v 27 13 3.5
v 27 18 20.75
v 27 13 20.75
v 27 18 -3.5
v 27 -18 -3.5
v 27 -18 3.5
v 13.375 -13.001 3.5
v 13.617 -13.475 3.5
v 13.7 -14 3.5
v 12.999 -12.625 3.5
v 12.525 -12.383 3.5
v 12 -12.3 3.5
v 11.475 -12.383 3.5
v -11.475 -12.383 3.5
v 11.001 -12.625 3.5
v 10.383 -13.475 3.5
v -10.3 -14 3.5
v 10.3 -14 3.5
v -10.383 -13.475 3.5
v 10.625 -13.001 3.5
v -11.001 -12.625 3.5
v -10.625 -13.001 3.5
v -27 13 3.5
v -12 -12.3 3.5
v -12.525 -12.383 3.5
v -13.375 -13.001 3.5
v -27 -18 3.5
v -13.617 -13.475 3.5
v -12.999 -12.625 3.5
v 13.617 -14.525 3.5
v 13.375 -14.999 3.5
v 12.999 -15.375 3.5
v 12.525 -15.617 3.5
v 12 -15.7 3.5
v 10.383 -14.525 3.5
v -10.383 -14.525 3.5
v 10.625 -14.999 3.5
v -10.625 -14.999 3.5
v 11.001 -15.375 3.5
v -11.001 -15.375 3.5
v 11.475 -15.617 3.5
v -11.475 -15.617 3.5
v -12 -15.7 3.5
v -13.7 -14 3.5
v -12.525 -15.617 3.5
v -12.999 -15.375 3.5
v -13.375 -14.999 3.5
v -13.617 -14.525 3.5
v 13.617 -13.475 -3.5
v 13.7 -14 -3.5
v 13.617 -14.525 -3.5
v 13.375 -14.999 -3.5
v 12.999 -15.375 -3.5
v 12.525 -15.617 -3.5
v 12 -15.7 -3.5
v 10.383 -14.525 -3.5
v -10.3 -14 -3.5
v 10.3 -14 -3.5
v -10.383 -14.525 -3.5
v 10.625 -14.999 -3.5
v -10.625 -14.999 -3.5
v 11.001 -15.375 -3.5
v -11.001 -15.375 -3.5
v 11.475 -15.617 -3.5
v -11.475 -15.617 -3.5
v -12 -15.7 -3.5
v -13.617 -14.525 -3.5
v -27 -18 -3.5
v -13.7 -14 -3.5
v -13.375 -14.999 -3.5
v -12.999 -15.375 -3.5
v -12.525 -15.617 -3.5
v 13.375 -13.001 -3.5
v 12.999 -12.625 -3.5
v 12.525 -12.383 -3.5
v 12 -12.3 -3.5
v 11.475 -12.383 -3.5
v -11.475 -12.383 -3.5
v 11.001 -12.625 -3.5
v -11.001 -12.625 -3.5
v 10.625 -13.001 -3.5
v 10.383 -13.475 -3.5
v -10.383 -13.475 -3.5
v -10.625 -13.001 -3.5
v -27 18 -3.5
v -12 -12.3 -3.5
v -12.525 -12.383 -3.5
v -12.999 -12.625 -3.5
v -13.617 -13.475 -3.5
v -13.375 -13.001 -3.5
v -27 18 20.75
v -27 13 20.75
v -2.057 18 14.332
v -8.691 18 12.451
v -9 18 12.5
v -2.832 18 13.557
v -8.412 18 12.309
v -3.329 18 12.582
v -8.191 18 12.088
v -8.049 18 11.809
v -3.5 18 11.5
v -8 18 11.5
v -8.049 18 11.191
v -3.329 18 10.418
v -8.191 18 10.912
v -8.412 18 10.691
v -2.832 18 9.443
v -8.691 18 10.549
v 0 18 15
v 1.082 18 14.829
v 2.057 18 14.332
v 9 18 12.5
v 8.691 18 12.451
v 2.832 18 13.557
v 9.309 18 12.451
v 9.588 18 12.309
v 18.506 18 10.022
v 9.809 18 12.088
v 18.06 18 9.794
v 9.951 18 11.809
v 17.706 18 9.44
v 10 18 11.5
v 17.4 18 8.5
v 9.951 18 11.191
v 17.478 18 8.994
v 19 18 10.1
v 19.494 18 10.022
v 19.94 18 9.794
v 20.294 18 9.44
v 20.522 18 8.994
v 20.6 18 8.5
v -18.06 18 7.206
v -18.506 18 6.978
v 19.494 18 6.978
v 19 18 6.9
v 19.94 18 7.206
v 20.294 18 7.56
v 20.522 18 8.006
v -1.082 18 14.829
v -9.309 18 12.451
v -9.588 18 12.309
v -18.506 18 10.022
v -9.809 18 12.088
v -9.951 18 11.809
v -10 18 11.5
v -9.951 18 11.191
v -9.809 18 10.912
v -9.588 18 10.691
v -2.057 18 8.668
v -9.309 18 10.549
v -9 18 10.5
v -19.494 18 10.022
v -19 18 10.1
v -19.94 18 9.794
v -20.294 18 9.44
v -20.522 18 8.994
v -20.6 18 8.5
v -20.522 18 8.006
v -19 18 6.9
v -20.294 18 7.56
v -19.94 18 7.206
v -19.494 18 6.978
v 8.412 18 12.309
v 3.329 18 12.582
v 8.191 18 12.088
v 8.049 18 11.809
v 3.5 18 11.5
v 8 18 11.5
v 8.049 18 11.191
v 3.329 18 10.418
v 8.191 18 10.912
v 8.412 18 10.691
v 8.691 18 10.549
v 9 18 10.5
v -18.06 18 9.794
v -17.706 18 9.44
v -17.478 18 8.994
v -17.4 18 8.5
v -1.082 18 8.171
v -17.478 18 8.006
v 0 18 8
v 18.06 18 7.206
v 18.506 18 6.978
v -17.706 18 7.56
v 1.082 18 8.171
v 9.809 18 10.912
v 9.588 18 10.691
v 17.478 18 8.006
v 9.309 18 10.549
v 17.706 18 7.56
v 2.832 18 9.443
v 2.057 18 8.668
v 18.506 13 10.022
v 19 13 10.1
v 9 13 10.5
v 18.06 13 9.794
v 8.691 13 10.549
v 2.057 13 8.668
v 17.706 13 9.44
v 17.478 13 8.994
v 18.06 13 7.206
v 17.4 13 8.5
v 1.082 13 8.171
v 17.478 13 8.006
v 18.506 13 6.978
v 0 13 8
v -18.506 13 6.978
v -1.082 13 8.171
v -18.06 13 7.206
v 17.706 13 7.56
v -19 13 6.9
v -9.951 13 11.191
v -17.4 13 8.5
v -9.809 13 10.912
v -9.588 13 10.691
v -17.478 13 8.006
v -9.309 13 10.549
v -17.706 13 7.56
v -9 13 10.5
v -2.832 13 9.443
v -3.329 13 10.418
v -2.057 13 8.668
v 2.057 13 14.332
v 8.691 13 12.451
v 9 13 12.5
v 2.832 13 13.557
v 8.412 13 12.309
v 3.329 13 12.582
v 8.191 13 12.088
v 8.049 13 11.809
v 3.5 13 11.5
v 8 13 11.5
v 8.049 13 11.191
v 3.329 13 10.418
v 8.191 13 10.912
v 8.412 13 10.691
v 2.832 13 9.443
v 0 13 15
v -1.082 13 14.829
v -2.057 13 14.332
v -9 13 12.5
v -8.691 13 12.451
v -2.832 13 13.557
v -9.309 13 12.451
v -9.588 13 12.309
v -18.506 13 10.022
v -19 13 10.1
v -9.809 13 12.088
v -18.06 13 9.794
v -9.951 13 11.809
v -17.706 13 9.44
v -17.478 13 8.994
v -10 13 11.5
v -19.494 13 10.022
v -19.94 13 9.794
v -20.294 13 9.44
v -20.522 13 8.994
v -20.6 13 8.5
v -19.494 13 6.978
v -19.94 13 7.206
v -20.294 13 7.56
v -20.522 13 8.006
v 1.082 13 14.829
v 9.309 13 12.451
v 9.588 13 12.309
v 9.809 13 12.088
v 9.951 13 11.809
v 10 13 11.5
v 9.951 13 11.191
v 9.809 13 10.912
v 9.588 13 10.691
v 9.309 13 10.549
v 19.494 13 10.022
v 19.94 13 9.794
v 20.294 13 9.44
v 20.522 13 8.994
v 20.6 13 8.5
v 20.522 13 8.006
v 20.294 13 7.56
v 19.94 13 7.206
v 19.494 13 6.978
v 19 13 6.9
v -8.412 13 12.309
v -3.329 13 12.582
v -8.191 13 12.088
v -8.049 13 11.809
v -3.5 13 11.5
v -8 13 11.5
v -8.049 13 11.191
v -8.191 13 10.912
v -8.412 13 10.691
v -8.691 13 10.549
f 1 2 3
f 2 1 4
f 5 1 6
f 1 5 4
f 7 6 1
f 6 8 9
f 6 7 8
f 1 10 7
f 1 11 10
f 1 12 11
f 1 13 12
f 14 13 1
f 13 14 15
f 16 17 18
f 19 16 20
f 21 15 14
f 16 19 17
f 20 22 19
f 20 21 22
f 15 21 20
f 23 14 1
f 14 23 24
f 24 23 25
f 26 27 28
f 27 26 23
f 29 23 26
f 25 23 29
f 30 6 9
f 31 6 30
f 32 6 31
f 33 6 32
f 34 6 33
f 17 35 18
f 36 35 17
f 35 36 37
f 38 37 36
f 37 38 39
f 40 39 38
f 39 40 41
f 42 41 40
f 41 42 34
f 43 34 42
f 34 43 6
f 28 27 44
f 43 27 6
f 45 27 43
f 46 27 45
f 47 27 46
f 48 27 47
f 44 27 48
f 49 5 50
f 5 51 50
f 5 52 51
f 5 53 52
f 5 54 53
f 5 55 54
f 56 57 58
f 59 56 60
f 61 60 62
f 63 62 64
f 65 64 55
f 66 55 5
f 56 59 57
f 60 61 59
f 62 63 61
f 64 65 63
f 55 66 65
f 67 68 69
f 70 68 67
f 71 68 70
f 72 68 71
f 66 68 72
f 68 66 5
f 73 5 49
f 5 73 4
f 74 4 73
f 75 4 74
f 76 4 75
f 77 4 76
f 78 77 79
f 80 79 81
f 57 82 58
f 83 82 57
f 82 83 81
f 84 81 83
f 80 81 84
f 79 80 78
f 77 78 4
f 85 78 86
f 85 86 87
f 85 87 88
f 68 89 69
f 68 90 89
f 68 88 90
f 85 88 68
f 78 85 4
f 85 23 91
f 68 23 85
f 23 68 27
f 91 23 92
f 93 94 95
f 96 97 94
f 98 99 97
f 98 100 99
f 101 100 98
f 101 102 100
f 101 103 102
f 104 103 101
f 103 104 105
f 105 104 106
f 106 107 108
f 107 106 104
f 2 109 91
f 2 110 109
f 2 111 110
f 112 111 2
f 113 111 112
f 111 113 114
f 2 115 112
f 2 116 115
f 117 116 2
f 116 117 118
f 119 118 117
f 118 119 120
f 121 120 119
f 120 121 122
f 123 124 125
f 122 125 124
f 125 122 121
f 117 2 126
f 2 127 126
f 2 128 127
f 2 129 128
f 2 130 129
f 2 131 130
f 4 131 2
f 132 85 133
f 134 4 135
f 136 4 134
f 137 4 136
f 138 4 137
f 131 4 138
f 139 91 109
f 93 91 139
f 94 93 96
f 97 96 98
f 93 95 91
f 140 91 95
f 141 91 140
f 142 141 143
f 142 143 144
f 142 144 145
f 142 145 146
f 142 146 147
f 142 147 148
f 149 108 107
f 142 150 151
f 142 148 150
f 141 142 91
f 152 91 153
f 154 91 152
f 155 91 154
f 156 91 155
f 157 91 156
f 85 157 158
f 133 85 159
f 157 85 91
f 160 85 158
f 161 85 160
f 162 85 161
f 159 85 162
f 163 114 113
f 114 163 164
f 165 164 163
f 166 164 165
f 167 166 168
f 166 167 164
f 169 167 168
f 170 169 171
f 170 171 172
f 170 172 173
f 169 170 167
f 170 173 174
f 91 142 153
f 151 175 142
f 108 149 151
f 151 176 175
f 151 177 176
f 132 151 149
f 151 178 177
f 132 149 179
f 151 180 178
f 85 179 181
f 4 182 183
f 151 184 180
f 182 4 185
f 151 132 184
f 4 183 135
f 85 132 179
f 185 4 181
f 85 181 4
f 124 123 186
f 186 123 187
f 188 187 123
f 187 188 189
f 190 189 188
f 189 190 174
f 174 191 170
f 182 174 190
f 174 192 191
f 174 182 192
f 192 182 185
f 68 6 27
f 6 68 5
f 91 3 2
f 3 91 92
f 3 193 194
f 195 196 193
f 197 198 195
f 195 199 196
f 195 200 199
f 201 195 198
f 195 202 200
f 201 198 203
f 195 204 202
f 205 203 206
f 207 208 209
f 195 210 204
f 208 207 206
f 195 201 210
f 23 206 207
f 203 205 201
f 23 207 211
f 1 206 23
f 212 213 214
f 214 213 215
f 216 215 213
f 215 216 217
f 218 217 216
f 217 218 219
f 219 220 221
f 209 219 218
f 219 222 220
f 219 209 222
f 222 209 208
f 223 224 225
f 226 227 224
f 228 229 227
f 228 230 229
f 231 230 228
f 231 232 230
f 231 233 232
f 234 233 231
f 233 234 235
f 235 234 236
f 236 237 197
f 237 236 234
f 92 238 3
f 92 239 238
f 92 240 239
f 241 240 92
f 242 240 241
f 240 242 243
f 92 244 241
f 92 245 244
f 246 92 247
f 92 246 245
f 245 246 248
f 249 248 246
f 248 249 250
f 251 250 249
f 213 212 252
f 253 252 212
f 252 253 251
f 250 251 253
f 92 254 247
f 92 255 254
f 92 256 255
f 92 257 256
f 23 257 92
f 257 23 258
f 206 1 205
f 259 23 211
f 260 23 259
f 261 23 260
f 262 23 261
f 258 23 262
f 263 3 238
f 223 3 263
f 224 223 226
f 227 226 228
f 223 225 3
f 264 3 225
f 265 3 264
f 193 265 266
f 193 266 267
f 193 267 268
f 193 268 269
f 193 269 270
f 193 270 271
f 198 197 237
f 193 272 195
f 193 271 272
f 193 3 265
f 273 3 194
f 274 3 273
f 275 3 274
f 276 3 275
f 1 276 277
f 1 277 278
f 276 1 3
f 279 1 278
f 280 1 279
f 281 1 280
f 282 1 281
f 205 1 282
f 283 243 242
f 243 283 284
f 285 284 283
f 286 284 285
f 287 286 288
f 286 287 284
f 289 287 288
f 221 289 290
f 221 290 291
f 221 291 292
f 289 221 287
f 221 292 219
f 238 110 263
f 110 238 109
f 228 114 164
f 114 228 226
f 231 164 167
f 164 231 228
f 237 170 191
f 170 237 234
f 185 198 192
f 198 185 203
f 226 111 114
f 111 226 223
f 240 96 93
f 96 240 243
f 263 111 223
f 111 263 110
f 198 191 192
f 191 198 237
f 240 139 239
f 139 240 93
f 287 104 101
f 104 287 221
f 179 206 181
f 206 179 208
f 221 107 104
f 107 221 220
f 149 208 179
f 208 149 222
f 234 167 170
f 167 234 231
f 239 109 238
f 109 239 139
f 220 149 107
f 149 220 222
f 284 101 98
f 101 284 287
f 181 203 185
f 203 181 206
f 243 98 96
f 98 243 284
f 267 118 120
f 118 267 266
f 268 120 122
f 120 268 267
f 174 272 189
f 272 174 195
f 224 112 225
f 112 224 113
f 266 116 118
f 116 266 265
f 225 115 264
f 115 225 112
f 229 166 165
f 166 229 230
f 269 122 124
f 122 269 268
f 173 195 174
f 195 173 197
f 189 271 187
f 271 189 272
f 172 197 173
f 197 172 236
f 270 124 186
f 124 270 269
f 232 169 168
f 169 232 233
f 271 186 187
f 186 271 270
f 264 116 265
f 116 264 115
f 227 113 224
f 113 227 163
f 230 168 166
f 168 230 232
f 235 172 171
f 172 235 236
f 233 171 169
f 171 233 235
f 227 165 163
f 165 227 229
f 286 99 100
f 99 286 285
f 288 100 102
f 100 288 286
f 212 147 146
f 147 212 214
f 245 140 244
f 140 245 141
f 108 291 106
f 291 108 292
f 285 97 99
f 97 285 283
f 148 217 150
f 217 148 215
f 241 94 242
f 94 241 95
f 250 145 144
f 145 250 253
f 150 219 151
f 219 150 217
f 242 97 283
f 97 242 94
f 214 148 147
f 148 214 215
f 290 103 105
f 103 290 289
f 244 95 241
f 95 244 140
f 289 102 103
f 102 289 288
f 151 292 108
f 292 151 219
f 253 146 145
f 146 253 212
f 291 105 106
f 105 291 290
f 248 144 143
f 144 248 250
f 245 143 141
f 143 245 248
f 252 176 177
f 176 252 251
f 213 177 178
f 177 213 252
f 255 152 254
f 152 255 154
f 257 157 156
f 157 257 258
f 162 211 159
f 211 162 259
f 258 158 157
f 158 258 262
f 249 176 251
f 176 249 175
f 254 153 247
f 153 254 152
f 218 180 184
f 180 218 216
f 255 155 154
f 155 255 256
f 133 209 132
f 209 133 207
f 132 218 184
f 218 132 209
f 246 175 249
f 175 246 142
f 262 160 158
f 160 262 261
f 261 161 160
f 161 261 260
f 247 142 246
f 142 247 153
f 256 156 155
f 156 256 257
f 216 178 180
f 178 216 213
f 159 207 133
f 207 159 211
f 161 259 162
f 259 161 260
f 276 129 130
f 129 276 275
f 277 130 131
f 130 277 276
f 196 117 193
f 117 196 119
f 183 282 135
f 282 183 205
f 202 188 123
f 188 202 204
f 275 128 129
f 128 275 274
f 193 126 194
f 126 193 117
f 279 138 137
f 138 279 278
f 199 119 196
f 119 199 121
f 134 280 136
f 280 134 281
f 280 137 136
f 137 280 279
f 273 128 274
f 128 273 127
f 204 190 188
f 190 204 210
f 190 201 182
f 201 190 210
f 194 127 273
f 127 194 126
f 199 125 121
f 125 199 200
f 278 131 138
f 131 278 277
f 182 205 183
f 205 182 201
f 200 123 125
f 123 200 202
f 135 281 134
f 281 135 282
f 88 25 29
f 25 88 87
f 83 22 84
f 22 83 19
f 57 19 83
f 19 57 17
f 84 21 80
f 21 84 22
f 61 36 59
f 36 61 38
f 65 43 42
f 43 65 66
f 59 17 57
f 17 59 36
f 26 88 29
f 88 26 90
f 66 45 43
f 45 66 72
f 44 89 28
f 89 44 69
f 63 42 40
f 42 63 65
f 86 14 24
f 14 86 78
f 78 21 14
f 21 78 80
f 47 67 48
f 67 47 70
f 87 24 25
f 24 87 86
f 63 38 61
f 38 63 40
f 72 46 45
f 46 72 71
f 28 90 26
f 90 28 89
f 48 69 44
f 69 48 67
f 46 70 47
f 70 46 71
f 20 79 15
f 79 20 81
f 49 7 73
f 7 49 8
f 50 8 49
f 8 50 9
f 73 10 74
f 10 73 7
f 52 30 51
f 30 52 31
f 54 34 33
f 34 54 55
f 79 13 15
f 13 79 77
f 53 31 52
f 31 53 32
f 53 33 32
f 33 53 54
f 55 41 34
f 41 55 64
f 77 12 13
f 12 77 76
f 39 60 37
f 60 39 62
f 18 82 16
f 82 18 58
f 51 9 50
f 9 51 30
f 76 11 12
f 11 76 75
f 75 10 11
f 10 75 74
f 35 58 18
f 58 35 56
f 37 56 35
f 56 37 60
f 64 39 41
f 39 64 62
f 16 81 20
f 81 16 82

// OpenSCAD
//Author: Piotr Paterek, Kraków 05-08.2016
$fn=20;
module base()
{
    cube([54,36,7], center=true);
    translate([0,15.5,11.5])
    {   
        cube([54,5,18.5], center=true);
    }
}
 
difference()
        {
    difference()
        {
        difference()
            {
                difference()
                    {
                    difference()
                        {
                        difference()
                            {
                            difference()
                            {
                                 base();
                                translate([0,15.5,11.5])
                                {
                                    rotate(a=90, v=[1,0,0])
                                    {
                                        cylinder(r=3.5, h=5, center=true);
                                    }
                                }
                            }
                             translate([9,15.5,11.5])
                                {
                                    rotate(a=90, v=[1,0,0])
                                    {
                                        cylinder(r=1, h=5, center=true);
                                    }
                                }
                            }
                        translate([9,15.5,11.5])
                            {
                                rotate(a=90, v=[1,0,0])
                                {
                                    cylinder(r=1, h=5, center=true);
                                }
                            }
                        
                    translate([-9,15.5,11.5])
                            {
                                rotate(a=90, v=[1,0,0])
                                {
                                    cylinder(r=1, h=5, center=true);
                                }
                            }
                        }
                translate([-19,15.5,8.5])
                    {
                        rotate(a=90, v=[1,0,0])
                        {
                            cylinder(r=1.6, h=5, center=true);
                        }
                    }
                }
        translate([19,15.5,8.5])
            {
                rotate(a=90, v=[1,0,0])
                {
                    cylinder(r=1.6, h=5, center=true);
                }
            }
        }
    translate([-12,-14,0])
            {
                
                    cylinder(r=1.7, h=7, center=true);
                
            }
        }
translate([12,-14,0])
        {
            
                cylinder(r=1.7, h=7, center=true);
            
        }
    }
